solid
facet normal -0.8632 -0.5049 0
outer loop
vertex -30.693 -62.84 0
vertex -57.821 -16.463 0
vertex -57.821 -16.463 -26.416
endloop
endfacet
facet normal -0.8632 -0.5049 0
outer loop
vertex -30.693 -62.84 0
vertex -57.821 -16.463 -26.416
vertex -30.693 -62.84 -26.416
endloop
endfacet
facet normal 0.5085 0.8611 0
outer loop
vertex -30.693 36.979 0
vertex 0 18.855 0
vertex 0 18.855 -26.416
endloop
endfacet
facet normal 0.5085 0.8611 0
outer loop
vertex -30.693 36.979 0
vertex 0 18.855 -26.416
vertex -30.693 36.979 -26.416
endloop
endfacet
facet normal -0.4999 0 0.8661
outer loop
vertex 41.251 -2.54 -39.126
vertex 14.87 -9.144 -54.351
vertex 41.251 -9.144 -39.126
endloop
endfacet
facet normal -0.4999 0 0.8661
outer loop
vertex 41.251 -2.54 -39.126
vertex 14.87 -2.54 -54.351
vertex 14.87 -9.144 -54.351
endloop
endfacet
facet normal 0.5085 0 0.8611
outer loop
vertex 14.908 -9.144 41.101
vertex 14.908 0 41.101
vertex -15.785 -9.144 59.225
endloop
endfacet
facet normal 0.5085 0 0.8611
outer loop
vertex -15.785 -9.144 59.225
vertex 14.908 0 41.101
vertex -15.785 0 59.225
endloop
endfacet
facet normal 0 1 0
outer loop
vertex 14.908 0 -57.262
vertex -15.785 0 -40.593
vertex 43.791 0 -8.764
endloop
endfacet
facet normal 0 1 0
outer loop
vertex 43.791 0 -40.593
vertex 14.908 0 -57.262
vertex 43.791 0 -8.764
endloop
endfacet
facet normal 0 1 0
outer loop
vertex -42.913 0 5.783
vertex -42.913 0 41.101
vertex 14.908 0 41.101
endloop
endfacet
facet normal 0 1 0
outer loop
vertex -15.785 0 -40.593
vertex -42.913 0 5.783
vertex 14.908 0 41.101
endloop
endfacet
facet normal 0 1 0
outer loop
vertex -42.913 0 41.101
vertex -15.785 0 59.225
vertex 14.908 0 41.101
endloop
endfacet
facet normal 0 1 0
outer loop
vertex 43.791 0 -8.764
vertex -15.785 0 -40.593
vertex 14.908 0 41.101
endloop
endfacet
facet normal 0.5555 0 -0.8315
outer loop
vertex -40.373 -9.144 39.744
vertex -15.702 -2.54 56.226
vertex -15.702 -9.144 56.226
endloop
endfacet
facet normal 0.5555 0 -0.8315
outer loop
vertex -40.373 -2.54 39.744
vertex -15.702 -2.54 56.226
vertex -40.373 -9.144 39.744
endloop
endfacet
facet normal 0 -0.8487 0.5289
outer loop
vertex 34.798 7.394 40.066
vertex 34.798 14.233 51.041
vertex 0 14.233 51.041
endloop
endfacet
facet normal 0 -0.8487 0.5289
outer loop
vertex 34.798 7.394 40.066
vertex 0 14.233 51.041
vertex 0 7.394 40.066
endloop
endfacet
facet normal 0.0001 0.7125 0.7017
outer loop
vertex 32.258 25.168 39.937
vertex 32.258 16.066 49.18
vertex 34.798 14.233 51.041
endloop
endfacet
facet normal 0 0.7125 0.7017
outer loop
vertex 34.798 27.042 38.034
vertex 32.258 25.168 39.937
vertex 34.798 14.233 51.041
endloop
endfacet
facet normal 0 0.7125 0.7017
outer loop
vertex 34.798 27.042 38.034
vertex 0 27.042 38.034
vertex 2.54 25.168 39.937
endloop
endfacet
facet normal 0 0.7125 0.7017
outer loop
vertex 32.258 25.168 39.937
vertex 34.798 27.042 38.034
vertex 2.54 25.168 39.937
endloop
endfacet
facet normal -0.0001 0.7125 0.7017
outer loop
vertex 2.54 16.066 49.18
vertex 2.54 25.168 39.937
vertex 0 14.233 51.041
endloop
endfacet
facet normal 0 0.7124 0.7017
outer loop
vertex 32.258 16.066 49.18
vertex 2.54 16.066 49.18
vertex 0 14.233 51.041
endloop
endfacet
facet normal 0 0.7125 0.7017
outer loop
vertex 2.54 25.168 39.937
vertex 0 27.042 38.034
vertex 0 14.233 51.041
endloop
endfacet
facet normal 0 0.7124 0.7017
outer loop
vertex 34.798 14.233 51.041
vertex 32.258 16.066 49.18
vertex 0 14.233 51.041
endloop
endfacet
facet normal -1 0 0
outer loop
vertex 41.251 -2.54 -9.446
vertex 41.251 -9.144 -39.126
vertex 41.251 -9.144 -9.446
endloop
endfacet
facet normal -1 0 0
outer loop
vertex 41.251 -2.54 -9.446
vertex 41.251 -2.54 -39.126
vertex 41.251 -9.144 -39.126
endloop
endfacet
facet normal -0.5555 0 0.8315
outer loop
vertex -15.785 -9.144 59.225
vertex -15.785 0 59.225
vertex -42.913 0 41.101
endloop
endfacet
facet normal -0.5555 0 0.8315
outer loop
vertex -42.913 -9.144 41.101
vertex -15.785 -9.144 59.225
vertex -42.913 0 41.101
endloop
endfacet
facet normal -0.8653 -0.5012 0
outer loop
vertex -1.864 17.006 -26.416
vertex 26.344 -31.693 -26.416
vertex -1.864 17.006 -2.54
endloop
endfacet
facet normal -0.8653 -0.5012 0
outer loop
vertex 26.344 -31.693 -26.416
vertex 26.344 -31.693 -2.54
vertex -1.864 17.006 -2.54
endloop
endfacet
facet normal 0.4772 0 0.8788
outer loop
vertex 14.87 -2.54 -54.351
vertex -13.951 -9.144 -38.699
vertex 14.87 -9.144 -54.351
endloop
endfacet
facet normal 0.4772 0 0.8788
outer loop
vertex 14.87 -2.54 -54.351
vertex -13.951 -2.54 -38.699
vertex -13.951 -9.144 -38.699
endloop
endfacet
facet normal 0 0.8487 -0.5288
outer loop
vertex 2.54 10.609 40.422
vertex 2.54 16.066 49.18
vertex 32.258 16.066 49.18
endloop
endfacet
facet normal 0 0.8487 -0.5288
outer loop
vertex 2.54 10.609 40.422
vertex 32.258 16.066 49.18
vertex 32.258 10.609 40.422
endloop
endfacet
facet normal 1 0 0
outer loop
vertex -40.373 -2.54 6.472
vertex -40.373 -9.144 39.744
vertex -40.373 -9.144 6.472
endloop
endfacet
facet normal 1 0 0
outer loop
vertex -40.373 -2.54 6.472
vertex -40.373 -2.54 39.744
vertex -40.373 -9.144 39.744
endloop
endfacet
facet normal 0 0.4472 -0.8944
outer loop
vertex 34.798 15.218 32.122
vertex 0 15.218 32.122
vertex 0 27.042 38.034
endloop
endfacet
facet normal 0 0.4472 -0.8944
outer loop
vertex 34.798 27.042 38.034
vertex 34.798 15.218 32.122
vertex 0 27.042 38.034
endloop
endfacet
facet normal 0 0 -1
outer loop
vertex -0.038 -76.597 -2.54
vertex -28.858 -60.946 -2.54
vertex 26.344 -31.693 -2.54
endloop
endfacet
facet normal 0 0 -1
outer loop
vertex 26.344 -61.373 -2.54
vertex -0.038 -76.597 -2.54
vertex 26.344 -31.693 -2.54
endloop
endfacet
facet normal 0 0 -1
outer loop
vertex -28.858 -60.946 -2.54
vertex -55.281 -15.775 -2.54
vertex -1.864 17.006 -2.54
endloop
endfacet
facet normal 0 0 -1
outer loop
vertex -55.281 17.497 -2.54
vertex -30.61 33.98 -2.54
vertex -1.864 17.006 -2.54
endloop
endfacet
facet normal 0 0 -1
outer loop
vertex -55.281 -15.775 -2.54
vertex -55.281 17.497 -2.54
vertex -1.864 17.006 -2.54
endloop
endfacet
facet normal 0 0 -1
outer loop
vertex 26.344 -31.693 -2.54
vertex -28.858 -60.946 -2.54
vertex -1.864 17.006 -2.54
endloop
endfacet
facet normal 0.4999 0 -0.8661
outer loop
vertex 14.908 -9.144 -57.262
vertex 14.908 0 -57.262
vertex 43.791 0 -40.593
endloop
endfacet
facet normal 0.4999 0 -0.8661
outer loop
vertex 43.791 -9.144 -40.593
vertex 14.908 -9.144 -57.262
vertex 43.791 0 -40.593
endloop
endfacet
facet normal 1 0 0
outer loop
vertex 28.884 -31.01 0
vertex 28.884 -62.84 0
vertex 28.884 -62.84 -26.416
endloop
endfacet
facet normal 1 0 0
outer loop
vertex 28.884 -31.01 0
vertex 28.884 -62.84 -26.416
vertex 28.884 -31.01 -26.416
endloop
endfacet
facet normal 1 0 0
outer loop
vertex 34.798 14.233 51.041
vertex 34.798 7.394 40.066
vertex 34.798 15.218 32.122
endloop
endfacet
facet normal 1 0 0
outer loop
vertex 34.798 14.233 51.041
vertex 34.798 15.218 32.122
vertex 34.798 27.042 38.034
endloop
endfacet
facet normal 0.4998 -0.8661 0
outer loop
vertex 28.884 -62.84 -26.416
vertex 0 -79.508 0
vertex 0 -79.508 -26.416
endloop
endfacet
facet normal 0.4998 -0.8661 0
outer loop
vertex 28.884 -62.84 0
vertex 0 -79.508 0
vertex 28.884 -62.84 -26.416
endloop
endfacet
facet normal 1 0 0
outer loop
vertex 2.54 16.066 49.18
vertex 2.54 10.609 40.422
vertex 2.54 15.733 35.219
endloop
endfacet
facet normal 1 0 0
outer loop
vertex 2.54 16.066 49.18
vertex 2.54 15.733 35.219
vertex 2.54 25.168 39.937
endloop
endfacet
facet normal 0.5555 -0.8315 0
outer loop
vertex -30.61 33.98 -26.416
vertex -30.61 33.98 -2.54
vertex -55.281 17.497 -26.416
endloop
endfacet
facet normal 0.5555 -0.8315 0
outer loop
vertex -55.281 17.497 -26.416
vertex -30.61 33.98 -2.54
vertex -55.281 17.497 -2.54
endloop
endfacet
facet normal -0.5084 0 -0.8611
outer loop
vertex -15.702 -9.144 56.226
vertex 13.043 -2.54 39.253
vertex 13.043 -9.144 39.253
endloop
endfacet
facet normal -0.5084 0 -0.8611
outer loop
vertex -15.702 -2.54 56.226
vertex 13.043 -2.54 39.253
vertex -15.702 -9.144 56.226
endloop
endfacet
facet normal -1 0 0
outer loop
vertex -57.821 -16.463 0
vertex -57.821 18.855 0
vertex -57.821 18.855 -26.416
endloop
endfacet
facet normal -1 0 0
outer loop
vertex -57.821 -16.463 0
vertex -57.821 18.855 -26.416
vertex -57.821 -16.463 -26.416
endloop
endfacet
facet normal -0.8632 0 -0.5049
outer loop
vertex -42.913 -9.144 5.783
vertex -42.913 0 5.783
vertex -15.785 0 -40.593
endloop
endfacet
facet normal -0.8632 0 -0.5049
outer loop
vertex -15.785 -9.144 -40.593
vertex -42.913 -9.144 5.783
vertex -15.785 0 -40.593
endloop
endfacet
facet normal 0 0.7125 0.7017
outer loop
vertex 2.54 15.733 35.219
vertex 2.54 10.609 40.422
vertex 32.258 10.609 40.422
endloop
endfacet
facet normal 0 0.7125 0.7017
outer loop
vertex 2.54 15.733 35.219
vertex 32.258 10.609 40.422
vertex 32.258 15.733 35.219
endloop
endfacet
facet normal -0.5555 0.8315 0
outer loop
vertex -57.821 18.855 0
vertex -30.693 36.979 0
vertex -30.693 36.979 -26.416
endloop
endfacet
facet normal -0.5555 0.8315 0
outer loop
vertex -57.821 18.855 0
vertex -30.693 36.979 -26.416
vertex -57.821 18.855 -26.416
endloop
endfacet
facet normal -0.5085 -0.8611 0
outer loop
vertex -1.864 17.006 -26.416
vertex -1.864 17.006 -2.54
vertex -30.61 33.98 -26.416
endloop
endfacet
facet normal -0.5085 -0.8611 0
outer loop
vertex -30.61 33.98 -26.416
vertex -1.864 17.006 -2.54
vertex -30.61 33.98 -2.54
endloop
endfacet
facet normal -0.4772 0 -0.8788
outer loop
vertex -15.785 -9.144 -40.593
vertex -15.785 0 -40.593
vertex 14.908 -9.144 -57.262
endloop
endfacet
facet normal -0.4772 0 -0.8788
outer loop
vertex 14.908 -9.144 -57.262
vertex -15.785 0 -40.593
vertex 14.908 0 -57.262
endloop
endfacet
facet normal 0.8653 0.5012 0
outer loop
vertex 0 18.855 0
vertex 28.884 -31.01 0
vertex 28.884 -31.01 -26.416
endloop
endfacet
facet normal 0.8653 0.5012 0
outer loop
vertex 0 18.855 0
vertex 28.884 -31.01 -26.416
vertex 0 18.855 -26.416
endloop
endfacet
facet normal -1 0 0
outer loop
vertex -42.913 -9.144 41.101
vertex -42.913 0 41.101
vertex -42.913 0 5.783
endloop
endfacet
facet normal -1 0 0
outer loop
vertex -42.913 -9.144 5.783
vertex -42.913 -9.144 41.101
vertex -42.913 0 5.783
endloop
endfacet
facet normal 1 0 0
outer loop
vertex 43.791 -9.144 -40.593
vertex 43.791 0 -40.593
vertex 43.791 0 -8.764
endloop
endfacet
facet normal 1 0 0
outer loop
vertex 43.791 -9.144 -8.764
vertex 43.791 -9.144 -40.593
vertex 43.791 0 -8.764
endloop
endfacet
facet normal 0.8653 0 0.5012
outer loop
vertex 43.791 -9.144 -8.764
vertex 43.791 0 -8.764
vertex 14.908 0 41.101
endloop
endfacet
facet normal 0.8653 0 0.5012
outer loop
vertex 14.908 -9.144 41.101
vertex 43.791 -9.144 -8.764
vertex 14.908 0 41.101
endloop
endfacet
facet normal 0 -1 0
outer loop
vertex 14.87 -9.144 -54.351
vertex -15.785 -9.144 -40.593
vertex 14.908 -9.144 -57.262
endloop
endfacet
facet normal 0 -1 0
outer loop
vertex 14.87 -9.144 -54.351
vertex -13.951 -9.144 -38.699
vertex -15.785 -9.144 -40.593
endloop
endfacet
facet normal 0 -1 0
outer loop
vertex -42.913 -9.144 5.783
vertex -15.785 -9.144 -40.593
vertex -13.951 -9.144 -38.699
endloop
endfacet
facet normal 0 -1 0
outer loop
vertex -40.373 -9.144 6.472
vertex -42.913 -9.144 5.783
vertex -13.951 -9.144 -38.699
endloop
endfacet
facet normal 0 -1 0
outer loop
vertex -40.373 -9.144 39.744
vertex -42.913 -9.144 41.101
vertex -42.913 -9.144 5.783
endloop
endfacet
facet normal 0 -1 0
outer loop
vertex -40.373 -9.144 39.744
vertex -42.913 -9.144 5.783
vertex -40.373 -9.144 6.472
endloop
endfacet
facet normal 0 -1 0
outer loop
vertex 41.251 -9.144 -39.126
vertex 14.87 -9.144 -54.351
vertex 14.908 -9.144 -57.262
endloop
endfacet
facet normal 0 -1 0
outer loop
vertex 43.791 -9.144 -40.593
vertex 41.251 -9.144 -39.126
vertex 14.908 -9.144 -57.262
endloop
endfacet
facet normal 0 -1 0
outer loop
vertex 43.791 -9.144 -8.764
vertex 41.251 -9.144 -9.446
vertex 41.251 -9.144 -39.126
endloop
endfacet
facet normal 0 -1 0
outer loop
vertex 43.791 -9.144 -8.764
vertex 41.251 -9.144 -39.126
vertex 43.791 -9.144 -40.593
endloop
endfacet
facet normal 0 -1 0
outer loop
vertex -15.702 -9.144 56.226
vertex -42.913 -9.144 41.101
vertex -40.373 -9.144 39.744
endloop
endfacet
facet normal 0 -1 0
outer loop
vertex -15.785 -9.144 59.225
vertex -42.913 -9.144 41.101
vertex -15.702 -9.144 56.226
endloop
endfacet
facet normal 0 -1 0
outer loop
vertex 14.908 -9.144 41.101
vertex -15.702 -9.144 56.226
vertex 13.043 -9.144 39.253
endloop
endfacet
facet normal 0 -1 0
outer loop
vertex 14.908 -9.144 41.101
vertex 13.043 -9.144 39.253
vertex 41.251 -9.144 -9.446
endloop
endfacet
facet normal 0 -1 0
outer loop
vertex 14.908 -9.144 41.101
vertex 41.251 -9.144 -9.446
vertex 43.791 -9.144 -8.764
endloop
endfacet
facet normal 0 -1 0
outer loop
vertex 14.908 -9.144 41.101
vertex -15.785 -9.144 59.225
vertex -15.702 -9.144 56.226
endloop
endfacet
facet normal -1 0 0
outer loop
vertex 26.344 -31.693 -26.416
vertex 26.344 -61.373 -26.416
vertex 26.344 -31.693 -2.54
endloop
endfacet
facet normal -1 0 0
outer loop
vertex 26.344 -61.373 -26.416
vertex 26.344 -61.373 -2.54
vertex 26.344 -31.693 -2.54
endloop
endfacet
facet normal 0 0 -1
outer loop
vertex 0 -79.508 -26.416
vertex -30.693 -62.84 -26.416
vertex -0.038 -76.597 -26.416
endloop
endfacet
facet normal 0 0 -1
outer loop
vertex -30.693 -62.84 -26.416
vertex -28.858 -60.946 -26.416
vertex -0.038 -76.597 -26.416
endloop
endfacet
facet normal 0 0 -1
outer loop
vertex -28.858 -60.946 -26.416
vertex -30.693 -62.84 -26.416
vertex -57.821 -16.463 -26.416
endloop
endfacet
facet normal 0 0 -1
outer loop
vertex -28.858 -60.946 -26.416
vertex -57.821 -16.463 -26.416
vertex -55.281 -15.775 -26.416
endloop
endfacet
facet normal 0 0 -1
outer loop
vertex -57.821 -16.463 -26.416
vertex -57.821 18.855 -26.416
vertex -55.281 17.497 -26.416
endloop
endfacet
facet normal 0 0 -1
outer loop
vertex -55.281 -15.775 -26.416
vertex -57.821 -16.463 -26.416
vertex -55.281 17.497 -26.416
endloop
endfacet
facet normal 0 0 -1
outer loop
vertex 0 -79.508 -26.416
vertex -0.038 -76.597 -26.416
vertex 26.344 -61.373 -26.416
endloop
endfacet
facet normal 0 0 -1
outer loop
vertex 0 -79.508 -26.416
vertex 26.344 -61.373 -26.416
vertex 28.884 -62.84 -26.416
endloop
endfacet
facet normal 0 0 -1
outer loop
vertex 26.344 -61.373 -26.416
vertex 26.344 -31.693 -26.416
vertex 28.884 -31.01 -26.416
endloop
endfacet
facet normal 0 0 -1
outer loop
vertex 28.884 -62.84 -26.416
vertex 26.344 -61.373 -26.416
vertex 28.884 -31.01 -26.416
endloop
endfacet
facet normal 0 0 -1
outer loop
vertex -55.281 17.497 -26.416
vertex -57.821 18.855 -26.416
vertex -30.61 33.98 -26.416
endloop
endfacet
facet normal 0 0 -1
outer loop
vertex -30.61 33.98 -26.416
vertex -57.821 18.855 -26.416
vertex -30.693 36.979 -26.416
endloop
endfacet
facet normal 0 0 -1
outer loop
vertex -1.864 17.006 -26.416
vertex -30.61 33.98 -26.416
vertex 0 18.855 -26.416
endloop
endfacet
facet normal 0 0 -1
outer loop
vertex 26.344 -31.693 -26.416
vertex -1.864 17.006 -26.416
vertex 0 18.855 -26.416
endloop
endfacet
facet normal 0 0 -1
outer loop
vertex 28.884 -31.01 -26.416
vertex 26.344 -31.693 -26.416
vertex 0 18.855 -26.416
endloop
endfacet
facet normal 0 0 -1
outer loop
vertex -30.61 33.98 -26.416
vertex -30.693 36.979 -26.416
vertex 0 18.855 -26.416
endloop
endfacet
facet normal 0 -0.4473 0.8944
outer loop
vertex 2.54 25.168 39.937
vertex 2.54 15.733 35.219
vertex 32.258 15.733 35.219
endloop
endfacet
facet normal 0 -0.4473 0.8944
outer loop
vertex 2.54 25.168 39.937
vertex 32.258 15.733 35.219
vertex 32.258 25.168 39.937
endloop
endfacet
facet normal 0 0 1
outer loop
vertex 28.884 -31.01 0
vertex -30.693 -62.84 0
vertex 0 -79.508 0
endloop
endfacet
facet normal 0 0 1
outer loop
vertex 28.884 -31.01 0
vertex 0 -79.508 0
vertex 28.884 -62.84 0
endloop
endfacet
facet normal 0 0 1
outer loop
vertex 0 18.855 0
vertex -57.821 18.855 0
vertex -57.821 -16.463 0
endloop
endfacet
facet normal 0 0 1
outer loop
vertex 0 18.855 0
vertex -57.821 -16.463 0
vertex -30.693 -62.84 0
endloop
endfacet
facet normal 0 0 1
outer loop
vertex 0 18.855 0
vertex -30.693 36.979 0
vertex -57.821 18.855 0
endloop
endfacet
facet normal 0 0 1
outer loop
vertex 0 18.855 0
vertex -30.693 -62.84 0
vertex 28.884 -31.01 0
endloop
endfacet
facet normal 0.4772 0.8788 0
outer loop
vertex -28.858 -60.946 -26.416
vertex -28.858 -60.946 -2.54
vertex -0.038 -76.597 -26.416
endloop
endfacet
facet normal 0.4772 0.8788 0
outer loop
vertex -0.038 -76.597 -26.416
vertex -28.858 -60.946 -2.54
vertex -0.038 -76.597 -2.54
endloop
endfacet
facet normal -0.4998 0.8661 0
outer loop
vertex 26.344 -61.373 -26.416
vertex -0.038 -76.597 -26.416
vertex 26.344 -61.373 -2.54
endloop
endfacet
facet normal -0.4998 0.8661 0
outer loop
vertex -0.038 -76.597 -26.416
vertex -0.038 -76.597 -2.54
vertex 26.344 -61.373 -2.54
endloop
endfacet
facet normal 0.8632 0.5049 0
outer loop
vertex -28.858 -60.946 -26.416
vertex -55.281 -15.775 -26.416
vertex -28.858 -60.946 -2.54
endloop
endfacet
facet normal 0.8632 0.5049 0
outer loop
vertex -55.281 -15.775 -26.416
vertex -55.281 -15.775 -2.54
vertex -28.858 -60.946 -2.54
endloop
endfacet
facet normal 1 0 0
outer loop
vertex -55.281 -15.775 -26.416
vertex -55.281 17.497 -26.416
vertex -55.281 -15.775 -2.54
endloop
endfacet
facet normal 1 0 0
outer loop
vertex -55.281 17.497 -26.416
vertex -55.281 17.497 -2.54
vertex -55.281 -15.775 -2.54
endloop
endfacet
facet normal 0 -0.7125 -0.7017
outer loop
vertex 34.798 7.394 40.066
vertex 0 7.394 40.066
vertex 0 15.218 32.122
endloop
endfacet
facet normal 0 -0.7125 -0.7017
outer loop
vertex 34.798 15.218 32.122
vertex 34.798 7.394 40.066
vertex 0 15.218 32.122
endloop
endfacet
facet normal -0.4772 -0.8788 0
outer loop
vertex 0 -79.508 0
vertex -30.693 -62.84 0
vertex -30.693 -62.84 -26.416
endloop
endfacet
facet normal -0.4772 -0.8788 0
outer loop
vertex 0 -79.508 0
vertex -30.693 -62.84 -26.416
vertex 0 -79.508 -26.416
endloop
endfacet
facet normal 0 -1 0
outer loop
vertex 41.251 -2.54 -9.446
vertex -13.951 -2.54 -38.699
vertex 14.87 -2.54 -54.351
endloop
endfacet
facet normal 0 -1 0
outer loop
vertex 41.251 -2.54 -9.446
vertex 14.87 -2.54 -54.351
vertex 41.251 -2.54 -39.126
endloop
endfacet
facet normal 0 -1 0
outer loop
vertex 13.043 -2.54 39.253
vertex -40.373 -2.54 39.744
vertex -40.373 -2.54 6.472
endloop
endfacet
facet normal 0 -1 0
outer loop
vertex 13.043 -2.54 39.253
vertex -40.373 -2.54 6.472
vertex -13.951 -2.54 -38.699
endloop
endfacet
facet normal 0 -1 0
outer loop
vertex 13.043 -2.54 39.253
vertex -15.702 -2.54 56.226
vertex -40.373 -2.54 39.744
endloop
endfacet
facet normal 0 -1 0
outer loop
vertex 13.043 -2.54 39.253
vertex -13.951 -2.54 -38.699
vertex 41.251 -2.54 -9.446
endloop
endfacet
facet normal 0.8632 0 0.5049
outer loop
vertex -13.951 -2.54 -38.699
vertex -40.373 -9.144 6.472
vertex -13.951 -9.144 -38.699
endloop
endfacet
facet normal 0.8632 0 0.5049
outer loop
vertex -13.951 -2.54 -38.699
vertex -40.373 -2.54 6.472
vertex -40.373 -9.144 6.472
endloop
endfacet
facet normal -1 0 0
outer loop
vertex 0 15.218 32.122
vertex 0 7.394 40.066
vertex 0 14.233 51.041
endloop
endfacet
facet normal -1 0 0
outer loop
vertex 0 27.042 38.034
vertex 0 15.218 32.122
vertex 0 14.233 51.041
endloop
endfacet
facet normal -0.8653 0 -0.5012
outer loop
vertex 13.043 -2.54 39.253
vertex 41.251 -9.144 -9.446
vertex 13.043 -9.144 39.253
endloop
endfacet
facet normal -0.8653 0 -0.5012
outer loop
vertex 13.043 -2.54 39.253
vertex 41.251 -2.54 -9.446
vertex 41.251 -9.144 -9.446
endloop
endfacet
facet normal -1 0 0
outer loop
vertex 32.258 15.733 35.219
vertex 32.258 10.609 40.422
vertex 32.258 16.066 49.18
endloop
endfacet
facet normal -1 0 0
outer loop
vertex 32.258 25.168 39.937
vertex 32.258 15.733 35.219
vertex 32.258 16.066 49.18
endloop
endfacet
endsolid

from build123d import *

# Parameters (mm, degrees)
F2_DEPTH  = 26.416
F3_T      = -2.54
F4_DEPTH  = 34.798
F5_T      = -2.54
F10_DEPTH = 9.144
F11_T     = -2.54


# Not quite as in the source:
# - a feature of the source that left no trace in its solid (it failed there, or was rolled back) is left out


with BuildPart() as f2:
    # F0 (on Top) → F2 (new body)
    with BuildSketch(Plane.XY):
        Polygon((-57.8209497035, 18.8549458981), (-57.8209497035, -16.4633058012), (-30.6930541992, -62.8396645188), (0, -79.508036375), (28.8835763931, -62.8396645188), (28.8835763931, -31.0100559145), (0, 18.8549458981), (-30.6930541992, 36.9788259268), align=None)
    extrude(amount=-F2_DEPTH)

    # F3
    f3_openings = [f2.faces().sort_by_distance(p)[0] for p in [
        (-15.016134, -21.984576, -26.416),
    ]]
    offset(amount=F3_T, openings=f3_openings)


with BuildPart() as f4:
    # F1 (on Right) → F4 (new body)
    with BuildSketch(Plane.YZ):
        Polygon((27.0421076566, 38.0343087018), (14.2326252535, 51.0408654809), (7.3943502405, 40.0662297715), (15.2179701254, 32.1222431958), align=None)
    extrude(amount=F4_DEPTH)

    # F5
    f5_openings = [f4.faces().sort_by_distance(p)[0] for p in [
        (17.399, 20.637366, 44.537587),
    ]]
    offset(amount=F5_T, openings=f5_openings)


with BuildPart() as f10:
    # F9 (on Front) → F10 (new body)
    with BuildSketch(Plane.XZ):
        Polygon((-42.9133428261, 41.1014470737), (-42.9133428261, 5.7831953745), (-15.7854473218, -40.5931633431), (14.9076068774, -57.2615351994), (43.7911832705, -40.5931633431), (43.7911832705, -8.7635547388), (14.9076068774, 41.1014470737), (-15.7854473218, 59.2253271025), align=None)
    extrude(amount=F10_DEPTH)

    # F11
    f11_openings = [f10.faces().sort_by_distance(p)[0] for p in [
        (-0.108527, -9.144, 0.261925),
    ]]
    offset(amount=F11_T, openings=f11_openings)


solid = Compound([f2.part, f4.part, f10.part])
